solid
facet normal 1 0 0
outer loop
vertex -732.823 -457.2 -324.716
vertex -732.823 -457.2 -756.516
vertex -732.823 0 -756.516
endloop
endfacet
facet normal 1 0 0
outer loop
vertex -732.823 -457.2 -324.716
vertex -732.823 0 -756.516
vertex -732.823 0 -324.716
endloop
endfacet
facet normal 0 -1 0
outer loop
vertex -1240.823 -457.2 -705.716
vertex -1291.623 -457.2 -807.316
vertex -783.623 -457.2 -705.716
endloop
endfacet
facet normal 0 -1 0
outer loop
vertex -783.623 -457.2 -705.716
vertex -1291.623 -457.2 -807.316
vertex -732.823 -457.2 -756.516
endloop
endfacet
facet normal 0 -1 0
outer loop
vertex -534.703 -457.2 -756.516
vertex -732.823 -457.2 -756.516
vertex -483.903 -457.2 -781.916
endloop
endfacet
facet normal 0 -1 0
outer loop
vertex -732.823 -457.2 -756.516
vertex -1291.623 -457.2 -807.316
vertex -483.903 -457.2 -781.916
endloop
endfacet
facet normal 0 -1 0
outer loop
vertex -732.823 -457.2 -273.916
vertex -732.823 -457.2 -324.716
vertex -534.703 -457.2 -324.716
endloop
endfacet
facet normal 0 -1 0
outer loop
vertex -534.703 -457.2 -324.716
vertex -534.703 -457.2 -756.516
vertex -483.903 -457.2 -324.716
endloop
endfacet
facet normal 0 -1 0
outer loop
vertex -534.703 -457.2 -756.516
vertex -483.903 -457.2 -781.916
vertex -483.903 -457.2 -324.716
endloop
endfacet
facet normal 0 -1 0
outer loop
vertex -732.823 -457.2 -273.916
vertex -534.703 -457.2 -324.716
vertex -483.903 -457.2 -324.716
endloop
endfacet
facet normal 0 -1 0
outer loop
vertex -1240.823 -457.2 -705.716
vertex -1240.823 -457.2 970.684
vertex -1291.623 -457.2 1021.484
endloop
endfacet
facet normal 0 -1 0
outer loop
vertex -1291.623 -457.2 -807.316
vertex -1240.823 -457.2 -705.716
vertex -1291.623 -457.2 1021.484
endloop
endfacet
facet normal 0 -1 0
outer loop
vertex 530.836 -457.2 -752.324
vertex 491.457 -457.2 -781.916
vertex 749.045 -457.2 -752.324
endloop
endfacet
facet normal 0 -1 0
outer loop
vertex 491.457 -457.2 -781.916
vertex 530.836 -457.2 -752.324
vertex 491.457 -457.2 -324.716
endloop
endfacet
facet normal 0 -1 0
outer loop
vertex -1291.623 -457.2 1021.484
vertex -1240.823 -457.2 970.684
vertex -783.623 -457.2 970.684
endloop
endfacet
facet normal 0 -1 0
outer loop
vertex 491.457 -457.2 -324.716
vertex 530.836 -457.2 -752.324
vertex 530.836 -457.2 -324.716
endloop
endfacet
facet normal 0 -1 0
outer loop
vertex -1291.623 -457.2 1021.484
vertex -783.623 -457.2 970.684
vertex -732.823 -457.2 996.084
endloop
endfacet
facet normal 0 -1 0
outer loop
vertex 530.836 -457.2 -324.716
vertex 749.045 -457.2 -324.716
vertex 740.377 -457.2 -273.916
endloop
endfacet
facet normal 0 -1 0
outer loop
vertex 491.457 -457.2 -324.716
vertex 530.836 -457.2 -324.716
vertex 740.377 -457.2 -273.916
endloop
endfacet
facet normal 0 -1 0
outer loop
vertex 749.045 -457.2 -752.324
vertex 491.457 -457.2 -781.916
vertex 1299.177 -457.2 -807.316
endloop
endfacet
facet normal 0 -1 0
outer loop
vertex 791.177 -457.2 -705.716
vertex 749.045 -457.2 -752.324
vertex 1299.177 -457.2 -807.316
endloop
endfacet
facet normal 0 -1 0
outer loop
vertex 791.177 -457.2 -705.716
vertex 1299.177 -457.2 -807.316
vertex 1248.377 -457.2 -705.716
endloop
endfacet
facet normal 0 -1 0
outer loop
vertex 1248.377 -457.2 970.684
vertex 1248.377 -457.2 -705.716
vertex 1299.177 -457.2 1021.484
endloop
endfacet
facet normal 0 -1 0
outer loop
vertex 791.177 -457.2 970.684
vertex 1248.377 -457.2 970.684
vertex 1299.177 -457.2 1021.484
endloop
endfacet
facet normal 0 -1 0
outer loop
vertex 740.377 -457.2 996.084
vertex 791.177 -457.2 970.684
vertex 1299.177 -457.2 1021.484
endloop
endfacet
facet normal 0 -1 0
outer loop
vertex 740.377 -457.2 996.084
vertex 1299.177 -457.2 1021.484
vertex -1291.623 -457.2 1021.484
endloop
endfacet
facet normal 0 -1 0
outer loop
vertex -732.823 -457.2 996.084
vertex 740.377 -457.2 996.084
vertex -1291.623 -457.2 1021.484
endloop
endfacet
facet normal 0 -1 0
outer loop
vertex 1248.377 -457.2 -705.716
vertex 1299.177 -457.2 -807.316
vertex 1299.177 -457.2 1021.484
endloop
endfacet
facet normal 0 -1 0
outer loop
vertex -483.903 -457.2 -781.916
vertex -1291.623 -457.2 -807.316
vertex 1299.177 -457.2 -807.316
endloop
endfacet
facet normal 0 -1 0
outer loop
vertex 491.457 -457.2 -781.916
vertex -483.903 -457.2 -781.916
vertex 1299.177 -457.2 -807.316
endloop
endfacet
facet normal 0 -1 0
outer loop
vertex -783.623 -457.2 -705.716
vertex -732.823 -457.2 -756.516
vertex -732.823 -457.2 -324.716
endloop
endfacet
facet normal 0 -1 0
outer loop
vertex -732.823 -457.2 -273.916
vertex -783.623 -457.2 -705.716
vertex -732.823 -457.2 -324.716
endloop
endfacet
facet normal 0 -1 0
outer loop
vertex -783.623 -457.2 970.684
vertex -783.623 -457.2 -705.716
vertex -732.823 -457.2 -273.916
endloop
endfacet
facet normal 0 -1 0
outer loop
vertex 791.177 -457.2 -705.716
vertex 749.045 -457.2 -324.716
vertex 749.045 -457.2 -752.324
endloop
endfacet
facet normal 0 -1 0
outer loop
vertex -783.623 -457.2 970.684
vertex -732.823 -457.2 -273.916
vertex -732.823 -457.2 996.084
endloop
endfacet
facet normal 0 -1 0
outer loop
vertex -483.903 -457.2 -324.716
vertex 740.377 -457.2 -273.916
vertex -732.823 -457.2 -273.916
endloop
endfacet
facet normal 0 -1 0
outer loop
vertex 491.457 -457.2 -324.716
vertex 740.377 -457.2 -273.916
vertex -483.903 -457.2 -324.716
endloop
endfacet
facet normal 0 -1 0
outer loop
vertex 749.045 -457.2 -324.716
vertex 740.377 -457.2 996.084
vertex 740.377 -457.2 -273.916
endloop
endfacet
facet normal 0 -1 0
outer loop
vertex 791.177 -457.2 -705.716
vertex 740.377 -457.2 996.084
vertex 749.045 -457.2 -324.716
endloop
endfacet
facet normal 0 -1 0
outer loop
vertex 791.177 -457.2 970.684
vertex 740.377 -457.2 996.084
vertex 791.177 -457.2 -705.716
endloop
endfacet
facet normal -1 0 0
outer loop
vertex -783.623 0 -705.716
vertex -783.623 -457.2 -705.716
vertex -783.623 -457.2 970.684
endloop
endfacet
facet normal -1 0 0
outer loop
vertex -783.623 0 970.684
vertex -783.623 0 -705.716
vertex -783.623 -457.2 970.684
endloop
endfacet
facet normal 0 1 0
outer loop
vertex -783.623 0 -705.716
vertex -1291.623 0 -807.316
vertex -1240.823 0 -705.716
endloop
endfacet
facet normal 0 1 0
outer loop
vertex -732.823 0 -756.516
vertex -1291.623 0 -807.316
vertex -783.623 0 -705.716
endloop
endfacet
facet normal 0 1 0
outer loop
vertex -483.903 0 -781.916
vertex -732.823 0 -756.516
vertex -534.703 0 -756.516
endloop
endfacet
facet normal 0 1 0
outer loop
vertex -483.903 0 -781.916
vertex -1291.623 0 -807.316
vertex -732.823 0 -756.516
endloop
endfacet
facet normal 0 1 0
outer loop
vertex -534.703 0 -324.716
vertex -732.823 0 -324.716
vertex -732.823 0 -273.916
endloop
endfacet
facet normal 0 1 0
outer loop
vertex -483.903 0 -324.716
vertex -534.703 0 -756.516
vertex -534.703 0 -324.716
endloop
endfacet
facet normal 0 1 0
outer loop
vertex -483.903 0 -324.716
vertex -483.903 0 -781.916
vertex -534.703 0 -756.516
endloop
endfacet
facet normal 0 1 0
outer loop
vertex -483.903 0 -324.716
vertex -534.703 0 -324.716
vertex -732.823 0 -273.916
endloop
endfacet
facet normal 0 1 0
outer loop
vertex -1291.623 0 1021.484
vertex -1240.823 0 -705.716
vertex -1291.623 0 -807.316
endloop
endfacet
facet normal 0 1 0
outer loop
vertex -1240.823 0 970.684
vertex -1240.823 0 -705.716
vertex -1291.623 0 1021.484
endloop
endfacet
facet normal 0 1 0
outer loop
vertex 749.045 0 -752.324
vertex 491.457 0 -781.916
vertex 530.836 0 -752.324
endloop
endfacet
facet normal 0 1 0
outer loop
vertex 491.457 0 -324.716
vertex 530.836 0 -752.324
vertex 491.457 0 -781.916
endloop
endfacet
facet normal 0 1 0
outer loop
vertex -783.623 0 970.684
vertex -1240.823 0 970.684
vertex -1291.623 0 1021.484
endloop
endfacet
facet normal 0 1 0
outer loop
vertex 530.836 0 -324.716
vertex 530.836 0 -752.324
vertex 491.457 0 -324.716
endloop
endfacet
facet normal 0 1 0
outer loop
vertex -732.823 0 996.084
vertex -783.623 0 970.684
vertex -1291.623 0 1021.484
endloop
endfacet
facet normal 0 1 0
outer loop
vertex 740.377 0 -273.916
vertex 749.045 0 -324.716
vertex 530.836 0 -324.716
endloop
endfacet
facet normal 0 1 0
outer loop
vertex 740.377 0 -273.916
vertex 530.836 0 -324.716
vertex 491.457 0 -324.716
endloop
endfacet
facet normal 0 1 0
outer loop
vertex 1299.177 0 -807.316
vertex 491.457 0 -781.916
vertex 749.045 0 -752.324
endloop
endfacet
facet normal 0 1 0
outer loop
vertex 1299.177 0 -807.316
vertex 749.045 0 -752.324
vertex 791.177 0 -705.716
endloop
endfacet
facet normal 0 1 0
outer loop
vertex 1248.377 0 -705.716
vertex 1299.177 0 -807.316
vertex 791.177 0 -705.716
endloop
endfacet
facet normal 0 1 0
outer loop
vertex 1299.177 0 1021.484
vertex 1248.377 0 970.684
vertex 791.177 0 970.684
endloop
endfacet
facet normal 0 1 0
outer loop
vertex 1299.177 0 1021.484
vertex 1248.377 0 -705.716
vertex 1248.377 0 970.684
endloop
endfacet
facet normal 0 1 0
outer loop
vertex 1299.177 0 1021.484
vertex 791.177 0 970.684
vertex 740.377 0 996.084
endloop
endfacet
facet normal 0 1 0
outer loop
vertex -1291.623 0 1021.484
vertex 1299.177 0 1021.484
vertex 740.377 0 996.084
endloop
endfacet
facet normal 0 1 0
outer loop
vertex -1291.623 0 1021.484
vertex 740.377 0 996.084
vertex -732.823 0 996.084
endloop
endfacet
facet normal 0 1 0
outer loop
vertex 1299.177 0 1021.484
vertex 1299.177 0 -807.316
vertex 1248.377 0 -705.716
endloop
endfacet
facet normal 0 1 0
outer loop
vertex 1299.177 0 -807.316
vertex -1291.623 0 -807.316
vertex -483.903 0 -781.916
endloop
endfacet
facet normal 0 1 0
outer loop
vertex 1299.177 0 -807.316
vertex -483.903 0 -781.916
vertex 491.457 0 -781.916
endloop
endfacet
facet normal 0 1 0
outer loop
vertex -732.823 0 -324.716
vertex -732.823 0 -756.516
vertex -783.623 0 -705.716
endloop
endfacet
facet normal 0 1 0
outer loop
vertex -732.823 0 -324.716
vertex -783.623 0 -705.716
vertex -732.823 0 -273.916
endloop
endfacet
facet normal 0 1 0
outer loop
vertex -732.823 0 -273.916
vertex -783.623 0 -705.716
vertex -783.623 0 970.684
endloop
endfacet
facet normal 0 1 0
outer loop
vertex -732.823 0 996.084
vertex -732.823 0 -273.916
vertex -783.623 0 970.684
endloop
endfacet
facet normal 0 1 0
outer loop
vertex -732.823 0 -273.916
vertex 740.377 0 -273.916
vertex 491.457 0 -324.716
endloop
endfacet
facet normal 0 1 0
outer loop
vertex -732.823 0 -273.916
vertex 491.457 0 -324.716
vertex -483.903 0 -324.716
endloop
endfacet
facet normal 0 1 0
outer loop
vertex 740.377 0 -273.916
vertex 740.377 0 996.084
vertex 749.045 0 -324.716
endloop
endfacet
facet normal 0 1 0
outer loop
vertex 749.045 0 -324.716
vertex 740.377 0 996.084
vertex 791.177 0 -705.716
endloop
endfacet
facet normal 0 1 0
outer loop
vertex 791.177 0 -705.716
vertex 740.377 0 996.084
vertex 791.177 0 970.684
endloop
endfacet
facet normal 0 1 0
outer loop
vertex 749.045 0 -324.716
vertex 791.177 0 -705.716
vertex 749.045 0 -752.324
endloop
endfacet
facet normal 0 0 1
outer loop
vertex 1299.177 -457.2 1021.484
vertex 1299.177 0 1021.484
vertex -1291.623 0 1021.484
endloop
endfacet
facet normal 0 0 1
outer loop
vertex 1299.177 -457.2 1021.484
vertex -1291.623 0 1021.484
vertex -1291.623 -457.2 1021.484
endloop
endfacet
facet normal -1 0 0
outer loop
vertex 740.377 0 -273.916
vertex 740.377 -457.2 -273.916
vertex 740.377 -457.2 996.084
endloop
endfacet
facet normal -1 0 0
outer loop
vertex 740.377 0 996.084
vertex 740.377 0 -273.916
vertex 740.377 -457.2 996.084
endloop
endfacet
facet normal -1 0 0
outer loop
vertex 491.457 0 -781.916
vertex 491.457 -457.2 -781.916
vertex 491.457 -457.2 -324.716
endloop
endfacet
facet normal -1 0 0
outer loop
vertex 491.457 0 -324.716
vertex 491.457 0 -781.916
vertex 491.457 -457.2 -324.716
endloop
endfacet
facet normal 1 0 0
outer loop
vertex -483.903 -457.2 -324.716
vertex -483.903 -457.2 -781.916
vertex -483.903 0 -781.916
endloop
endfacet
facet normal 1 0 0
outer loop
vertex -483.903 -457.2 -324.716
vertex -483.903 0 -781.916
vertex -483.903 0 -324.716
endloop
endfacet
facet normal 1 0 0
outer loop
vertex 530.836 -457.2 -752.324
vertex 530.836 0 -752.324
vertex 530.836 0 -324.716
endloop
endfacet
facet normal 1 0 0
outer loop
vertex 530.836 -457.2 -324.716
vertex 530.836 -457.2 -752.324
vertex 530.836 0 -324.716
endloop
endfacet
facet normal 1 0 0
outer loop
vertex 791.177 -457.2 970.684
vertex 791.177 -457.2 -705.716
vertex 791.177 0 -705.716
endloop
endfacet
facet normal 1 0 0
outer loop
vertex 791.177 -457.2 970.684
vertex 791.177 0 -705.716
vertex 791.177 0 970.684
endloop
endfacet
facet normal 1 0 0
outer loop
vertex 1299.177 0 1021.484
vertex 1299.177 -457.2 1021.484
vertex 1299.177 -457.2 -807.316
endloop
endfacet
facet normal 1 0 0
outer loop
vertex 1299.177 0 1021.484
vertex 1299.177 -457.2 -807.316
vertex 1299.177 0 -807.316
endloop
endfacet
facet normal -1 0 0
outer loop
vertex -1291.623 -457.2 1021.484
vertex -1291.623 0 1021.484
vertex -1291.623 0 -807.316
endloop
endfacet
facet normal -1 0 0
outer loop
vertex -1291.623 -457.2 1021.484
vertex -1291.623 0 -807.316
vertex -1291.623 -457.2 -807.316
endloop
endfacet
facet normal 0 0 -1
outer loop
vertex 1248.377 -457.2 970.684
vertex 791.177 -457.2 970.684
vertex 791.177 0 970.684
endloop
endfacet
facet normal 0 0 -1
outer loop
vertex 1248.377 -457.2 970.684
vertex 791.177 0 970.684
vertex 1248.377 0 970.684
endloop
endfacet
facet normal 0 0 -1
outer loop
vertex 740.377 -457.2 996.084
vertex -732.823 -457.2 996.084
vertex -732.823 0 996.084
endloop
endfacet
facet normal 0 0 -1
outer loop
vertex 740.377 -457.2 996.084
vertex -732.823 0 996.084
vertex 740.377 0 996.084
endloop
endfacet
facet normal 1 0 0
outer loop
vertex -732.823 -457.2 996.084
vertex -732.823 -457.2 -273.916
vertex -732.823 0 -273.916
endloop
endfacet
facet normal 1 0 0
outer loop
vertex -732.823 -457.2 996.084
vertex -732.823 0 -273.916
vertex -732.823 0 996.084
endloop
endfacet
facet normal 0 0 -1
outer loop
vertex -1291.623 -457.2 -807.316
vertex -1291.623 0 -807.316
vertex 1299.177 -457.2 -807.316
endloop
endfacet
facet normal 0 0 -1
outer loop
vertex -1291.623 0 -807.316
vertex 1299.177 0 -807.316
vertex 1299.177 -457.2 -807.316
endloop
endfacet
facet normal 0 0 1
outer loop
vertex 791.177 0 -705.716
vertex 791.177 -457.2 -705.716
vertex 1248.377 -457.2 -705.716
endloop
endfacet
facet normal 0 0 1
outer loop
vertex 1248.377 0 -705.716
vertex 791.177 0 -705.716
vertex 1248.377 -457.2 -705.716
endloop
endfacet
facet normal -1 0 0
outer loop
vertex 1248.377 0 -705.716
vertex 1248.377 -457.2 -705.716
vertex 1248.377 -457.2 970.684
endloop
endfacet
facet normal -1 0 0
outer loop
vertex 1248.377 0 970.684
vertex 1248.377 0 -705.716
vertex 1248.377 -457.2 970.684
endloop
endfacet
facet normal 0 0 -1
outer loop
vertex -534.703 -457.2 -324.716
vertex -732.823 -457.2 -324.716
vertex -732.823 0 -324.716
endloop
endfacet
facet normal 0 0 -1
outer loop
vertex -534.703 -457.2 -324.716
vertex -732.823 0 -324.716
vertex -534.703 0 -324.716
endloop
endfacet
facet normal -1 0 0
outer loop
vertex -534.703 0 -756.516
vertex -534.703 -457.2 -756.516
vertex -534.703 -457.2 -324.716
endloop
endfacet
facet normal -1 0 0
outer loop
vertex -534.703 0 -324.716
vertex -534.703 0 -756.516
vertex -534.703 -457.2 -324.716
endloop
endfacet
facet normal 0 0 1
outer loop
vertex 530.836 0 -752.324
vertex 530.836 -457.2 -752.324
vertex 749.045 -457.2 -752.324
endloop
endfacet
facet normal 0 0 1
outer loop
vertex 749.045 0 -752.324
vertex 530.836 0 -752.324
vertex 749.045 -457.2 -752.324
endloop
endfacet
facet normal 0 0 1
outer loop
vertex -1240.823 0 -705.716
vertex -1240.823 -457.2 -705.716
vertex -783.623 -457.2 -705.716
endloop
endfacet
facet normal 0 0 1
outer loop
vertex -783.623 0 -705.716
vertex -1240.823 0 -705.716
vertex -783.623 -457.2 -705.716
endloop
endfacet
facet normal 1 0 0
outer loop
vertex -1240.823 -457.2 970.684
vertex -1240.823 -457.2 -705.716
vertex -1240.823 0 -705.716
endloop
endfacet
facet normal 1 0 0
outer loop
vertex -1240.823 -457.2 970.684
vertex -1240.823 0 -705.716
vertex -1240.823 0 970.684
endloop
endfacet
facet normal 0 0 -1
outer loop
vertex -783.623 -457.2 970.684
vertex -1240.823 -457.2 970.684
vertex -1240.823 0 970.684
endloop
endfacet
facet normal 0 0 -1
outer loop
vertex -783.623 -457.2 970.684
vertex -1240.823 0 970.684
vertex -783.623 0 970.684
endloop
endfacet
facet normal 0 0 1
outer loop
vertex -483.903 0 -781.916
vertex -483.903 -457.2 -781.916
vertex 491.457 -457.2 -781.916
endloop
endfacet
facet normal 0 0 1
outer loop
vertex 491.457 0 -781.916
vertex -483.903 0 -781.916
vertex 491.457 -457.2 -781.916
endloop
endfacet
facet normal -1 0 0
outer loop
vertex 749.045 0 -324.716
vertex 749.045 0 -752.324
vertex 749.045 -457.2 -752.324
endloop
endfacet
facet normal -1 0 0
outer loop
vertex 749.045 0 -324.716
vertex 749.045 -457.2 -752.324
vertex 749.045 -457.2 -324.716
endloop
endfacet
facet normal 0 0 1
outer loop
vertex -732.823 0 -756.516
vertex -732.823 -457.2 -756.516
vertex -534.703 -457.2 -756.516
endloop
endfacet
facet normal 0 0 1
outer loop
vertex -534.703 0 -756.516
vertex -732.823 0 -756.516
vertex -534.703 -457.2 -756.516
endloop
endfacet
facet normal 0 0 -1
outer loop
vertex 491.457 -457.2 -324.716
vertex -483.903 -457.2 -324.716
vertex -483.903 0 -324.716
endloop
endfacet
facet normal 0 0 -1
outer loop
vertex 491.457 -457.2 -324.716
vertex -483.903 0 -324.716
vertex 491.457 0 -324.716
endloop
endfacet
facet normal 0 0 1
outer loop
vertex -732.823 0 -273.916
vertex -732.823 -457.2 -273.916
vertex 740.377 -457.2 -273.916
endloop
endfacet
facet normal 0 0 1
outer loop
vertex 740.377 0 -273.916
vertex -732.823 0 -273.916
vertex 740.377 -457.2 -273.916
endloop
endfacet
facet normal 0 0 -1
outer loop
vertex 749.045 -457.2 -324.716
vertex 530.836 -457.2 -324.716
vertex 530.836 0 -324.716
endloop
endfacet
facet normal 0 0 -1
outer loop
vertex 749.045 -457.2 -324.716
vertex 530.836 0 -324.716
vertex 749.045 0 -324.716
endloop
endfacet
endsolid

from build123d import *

# Parameters (mm, degrees)
F0_W      = 1524
F0_H      = 1828.8
F1_DEPTH  = 457.2
F2_W      = 1473.2
F2_H      = 1270
F3_DEPTH  = 457.201
F4_W      = 975.36
F4_H      = 457.2
F5_DEPTH  = 457.201
F6_W      = 457.2
F6_H      = 1828.8
F7_DEPTH  = 533.4
F8_W      = 457.2
F8_H      = 1828.8
F9_DEPTH  = 533.4
F10_W     = 457.2
F10_H     = 1676.4
F11_DEPTH = 457.201
F12_W     = 457.2
F12_H     = 1676.4
F13_DEPTH = 457.201
F14_W     = 198.12
F14_H     = 431.8
F15_DEPTH = 457.201
F16_W     = 218.209088
F16_H     = 427.608116
F17_DEPTH = 457.201


with BuildPart() as f1:
    # F0 (on Front) → F1 (new body)
    with BuildSketch(Plane.XZ):
        with Locations((3.776696, 107.083714)):
            Rectangle(F0_W, F0_H)
    extrude(amount=F1_DEPTH)

    # F2 (on face) → F3 (cut, through all)
    with BuildSketch(Plane.XZ.offset(457.2)):
        with Locations((3.776696, 361.083714)):
            Rectangle(F2_W, F2_H)
    extrude(amount=-F3_DEPTH, mode=Mode.SUBTRACT)

    # F4 (on face) → F5 (cut, through all)
    with BuildSketch(Plane.XZ.offset(457.2)):
        with Locations((3.776696, -553.316286)):
            Rectangle(F4_W, F4_H)
    extrude(amount=-F5_DEPTH, mode=Mode.SUBTRACT)

    # F6 (on face) → F7 (join)
    with BuildSketch(Plane.YZ.offset(765.776696)):
        with Locations((-228.6, 107.083714)):
            Rectangle(F6_W, F6_H)
    extrude(amount=F7_DEPTH)

    # F8 (on face) → F9 (join)
    with BuildSketch(Plane(origin=(-758.223304, 0, 0), x_dir=(0, -1, 0), z_dir=(-1, 0, 0))):
        with Locations((228.6, 107.083714)):
            Rectangle(F8_W, F8_H)
    extrude(amount=F9_DEPTH)

    # F10 (on face) → F11 (cut, through all)
    with BuildSketch(Plane.XZ.offset(457.2)):
        with Locations((-1012.223304, 132.483714)):
            Rectangle(F10_W, F10_H)
    extrude(amount=-F11_DEPTH, mode=Mode.SUBTRACT)

    # F12 (on face) → F13 (cut, through all)
    with BuildSketch(Plane.XZ.offset(457.2)):
        with Locations((1019.776696, 132.483714)):
            Rectangle(F12_W, F12_H)
    extrude(amount=-F13_DEPTH, mode=Mode.SUBTRACT)

    # F14 (on face) → F15 (cut, through all)
    with BuildSketch(Plane.XZ.offset(457.2)):
        with Locations((-633.763304, -540.616286)):
            Rectangle(F14_W, F14_H)
    extrude(amount=-F15_DEPTH, mode=Mode.SUBTRACT)

    # F16 (on face) → F17 (cut, through all)
    with BuildSketch(Plane.XZ.offset(457.2)):
        with Locations((639.940113, -538.520344)):
            Rectangle(F16_W, F16_H)
    extrude(amount=-F17_DEPTH, mode=Mode.SUBTRACT)


solid = f1.part
